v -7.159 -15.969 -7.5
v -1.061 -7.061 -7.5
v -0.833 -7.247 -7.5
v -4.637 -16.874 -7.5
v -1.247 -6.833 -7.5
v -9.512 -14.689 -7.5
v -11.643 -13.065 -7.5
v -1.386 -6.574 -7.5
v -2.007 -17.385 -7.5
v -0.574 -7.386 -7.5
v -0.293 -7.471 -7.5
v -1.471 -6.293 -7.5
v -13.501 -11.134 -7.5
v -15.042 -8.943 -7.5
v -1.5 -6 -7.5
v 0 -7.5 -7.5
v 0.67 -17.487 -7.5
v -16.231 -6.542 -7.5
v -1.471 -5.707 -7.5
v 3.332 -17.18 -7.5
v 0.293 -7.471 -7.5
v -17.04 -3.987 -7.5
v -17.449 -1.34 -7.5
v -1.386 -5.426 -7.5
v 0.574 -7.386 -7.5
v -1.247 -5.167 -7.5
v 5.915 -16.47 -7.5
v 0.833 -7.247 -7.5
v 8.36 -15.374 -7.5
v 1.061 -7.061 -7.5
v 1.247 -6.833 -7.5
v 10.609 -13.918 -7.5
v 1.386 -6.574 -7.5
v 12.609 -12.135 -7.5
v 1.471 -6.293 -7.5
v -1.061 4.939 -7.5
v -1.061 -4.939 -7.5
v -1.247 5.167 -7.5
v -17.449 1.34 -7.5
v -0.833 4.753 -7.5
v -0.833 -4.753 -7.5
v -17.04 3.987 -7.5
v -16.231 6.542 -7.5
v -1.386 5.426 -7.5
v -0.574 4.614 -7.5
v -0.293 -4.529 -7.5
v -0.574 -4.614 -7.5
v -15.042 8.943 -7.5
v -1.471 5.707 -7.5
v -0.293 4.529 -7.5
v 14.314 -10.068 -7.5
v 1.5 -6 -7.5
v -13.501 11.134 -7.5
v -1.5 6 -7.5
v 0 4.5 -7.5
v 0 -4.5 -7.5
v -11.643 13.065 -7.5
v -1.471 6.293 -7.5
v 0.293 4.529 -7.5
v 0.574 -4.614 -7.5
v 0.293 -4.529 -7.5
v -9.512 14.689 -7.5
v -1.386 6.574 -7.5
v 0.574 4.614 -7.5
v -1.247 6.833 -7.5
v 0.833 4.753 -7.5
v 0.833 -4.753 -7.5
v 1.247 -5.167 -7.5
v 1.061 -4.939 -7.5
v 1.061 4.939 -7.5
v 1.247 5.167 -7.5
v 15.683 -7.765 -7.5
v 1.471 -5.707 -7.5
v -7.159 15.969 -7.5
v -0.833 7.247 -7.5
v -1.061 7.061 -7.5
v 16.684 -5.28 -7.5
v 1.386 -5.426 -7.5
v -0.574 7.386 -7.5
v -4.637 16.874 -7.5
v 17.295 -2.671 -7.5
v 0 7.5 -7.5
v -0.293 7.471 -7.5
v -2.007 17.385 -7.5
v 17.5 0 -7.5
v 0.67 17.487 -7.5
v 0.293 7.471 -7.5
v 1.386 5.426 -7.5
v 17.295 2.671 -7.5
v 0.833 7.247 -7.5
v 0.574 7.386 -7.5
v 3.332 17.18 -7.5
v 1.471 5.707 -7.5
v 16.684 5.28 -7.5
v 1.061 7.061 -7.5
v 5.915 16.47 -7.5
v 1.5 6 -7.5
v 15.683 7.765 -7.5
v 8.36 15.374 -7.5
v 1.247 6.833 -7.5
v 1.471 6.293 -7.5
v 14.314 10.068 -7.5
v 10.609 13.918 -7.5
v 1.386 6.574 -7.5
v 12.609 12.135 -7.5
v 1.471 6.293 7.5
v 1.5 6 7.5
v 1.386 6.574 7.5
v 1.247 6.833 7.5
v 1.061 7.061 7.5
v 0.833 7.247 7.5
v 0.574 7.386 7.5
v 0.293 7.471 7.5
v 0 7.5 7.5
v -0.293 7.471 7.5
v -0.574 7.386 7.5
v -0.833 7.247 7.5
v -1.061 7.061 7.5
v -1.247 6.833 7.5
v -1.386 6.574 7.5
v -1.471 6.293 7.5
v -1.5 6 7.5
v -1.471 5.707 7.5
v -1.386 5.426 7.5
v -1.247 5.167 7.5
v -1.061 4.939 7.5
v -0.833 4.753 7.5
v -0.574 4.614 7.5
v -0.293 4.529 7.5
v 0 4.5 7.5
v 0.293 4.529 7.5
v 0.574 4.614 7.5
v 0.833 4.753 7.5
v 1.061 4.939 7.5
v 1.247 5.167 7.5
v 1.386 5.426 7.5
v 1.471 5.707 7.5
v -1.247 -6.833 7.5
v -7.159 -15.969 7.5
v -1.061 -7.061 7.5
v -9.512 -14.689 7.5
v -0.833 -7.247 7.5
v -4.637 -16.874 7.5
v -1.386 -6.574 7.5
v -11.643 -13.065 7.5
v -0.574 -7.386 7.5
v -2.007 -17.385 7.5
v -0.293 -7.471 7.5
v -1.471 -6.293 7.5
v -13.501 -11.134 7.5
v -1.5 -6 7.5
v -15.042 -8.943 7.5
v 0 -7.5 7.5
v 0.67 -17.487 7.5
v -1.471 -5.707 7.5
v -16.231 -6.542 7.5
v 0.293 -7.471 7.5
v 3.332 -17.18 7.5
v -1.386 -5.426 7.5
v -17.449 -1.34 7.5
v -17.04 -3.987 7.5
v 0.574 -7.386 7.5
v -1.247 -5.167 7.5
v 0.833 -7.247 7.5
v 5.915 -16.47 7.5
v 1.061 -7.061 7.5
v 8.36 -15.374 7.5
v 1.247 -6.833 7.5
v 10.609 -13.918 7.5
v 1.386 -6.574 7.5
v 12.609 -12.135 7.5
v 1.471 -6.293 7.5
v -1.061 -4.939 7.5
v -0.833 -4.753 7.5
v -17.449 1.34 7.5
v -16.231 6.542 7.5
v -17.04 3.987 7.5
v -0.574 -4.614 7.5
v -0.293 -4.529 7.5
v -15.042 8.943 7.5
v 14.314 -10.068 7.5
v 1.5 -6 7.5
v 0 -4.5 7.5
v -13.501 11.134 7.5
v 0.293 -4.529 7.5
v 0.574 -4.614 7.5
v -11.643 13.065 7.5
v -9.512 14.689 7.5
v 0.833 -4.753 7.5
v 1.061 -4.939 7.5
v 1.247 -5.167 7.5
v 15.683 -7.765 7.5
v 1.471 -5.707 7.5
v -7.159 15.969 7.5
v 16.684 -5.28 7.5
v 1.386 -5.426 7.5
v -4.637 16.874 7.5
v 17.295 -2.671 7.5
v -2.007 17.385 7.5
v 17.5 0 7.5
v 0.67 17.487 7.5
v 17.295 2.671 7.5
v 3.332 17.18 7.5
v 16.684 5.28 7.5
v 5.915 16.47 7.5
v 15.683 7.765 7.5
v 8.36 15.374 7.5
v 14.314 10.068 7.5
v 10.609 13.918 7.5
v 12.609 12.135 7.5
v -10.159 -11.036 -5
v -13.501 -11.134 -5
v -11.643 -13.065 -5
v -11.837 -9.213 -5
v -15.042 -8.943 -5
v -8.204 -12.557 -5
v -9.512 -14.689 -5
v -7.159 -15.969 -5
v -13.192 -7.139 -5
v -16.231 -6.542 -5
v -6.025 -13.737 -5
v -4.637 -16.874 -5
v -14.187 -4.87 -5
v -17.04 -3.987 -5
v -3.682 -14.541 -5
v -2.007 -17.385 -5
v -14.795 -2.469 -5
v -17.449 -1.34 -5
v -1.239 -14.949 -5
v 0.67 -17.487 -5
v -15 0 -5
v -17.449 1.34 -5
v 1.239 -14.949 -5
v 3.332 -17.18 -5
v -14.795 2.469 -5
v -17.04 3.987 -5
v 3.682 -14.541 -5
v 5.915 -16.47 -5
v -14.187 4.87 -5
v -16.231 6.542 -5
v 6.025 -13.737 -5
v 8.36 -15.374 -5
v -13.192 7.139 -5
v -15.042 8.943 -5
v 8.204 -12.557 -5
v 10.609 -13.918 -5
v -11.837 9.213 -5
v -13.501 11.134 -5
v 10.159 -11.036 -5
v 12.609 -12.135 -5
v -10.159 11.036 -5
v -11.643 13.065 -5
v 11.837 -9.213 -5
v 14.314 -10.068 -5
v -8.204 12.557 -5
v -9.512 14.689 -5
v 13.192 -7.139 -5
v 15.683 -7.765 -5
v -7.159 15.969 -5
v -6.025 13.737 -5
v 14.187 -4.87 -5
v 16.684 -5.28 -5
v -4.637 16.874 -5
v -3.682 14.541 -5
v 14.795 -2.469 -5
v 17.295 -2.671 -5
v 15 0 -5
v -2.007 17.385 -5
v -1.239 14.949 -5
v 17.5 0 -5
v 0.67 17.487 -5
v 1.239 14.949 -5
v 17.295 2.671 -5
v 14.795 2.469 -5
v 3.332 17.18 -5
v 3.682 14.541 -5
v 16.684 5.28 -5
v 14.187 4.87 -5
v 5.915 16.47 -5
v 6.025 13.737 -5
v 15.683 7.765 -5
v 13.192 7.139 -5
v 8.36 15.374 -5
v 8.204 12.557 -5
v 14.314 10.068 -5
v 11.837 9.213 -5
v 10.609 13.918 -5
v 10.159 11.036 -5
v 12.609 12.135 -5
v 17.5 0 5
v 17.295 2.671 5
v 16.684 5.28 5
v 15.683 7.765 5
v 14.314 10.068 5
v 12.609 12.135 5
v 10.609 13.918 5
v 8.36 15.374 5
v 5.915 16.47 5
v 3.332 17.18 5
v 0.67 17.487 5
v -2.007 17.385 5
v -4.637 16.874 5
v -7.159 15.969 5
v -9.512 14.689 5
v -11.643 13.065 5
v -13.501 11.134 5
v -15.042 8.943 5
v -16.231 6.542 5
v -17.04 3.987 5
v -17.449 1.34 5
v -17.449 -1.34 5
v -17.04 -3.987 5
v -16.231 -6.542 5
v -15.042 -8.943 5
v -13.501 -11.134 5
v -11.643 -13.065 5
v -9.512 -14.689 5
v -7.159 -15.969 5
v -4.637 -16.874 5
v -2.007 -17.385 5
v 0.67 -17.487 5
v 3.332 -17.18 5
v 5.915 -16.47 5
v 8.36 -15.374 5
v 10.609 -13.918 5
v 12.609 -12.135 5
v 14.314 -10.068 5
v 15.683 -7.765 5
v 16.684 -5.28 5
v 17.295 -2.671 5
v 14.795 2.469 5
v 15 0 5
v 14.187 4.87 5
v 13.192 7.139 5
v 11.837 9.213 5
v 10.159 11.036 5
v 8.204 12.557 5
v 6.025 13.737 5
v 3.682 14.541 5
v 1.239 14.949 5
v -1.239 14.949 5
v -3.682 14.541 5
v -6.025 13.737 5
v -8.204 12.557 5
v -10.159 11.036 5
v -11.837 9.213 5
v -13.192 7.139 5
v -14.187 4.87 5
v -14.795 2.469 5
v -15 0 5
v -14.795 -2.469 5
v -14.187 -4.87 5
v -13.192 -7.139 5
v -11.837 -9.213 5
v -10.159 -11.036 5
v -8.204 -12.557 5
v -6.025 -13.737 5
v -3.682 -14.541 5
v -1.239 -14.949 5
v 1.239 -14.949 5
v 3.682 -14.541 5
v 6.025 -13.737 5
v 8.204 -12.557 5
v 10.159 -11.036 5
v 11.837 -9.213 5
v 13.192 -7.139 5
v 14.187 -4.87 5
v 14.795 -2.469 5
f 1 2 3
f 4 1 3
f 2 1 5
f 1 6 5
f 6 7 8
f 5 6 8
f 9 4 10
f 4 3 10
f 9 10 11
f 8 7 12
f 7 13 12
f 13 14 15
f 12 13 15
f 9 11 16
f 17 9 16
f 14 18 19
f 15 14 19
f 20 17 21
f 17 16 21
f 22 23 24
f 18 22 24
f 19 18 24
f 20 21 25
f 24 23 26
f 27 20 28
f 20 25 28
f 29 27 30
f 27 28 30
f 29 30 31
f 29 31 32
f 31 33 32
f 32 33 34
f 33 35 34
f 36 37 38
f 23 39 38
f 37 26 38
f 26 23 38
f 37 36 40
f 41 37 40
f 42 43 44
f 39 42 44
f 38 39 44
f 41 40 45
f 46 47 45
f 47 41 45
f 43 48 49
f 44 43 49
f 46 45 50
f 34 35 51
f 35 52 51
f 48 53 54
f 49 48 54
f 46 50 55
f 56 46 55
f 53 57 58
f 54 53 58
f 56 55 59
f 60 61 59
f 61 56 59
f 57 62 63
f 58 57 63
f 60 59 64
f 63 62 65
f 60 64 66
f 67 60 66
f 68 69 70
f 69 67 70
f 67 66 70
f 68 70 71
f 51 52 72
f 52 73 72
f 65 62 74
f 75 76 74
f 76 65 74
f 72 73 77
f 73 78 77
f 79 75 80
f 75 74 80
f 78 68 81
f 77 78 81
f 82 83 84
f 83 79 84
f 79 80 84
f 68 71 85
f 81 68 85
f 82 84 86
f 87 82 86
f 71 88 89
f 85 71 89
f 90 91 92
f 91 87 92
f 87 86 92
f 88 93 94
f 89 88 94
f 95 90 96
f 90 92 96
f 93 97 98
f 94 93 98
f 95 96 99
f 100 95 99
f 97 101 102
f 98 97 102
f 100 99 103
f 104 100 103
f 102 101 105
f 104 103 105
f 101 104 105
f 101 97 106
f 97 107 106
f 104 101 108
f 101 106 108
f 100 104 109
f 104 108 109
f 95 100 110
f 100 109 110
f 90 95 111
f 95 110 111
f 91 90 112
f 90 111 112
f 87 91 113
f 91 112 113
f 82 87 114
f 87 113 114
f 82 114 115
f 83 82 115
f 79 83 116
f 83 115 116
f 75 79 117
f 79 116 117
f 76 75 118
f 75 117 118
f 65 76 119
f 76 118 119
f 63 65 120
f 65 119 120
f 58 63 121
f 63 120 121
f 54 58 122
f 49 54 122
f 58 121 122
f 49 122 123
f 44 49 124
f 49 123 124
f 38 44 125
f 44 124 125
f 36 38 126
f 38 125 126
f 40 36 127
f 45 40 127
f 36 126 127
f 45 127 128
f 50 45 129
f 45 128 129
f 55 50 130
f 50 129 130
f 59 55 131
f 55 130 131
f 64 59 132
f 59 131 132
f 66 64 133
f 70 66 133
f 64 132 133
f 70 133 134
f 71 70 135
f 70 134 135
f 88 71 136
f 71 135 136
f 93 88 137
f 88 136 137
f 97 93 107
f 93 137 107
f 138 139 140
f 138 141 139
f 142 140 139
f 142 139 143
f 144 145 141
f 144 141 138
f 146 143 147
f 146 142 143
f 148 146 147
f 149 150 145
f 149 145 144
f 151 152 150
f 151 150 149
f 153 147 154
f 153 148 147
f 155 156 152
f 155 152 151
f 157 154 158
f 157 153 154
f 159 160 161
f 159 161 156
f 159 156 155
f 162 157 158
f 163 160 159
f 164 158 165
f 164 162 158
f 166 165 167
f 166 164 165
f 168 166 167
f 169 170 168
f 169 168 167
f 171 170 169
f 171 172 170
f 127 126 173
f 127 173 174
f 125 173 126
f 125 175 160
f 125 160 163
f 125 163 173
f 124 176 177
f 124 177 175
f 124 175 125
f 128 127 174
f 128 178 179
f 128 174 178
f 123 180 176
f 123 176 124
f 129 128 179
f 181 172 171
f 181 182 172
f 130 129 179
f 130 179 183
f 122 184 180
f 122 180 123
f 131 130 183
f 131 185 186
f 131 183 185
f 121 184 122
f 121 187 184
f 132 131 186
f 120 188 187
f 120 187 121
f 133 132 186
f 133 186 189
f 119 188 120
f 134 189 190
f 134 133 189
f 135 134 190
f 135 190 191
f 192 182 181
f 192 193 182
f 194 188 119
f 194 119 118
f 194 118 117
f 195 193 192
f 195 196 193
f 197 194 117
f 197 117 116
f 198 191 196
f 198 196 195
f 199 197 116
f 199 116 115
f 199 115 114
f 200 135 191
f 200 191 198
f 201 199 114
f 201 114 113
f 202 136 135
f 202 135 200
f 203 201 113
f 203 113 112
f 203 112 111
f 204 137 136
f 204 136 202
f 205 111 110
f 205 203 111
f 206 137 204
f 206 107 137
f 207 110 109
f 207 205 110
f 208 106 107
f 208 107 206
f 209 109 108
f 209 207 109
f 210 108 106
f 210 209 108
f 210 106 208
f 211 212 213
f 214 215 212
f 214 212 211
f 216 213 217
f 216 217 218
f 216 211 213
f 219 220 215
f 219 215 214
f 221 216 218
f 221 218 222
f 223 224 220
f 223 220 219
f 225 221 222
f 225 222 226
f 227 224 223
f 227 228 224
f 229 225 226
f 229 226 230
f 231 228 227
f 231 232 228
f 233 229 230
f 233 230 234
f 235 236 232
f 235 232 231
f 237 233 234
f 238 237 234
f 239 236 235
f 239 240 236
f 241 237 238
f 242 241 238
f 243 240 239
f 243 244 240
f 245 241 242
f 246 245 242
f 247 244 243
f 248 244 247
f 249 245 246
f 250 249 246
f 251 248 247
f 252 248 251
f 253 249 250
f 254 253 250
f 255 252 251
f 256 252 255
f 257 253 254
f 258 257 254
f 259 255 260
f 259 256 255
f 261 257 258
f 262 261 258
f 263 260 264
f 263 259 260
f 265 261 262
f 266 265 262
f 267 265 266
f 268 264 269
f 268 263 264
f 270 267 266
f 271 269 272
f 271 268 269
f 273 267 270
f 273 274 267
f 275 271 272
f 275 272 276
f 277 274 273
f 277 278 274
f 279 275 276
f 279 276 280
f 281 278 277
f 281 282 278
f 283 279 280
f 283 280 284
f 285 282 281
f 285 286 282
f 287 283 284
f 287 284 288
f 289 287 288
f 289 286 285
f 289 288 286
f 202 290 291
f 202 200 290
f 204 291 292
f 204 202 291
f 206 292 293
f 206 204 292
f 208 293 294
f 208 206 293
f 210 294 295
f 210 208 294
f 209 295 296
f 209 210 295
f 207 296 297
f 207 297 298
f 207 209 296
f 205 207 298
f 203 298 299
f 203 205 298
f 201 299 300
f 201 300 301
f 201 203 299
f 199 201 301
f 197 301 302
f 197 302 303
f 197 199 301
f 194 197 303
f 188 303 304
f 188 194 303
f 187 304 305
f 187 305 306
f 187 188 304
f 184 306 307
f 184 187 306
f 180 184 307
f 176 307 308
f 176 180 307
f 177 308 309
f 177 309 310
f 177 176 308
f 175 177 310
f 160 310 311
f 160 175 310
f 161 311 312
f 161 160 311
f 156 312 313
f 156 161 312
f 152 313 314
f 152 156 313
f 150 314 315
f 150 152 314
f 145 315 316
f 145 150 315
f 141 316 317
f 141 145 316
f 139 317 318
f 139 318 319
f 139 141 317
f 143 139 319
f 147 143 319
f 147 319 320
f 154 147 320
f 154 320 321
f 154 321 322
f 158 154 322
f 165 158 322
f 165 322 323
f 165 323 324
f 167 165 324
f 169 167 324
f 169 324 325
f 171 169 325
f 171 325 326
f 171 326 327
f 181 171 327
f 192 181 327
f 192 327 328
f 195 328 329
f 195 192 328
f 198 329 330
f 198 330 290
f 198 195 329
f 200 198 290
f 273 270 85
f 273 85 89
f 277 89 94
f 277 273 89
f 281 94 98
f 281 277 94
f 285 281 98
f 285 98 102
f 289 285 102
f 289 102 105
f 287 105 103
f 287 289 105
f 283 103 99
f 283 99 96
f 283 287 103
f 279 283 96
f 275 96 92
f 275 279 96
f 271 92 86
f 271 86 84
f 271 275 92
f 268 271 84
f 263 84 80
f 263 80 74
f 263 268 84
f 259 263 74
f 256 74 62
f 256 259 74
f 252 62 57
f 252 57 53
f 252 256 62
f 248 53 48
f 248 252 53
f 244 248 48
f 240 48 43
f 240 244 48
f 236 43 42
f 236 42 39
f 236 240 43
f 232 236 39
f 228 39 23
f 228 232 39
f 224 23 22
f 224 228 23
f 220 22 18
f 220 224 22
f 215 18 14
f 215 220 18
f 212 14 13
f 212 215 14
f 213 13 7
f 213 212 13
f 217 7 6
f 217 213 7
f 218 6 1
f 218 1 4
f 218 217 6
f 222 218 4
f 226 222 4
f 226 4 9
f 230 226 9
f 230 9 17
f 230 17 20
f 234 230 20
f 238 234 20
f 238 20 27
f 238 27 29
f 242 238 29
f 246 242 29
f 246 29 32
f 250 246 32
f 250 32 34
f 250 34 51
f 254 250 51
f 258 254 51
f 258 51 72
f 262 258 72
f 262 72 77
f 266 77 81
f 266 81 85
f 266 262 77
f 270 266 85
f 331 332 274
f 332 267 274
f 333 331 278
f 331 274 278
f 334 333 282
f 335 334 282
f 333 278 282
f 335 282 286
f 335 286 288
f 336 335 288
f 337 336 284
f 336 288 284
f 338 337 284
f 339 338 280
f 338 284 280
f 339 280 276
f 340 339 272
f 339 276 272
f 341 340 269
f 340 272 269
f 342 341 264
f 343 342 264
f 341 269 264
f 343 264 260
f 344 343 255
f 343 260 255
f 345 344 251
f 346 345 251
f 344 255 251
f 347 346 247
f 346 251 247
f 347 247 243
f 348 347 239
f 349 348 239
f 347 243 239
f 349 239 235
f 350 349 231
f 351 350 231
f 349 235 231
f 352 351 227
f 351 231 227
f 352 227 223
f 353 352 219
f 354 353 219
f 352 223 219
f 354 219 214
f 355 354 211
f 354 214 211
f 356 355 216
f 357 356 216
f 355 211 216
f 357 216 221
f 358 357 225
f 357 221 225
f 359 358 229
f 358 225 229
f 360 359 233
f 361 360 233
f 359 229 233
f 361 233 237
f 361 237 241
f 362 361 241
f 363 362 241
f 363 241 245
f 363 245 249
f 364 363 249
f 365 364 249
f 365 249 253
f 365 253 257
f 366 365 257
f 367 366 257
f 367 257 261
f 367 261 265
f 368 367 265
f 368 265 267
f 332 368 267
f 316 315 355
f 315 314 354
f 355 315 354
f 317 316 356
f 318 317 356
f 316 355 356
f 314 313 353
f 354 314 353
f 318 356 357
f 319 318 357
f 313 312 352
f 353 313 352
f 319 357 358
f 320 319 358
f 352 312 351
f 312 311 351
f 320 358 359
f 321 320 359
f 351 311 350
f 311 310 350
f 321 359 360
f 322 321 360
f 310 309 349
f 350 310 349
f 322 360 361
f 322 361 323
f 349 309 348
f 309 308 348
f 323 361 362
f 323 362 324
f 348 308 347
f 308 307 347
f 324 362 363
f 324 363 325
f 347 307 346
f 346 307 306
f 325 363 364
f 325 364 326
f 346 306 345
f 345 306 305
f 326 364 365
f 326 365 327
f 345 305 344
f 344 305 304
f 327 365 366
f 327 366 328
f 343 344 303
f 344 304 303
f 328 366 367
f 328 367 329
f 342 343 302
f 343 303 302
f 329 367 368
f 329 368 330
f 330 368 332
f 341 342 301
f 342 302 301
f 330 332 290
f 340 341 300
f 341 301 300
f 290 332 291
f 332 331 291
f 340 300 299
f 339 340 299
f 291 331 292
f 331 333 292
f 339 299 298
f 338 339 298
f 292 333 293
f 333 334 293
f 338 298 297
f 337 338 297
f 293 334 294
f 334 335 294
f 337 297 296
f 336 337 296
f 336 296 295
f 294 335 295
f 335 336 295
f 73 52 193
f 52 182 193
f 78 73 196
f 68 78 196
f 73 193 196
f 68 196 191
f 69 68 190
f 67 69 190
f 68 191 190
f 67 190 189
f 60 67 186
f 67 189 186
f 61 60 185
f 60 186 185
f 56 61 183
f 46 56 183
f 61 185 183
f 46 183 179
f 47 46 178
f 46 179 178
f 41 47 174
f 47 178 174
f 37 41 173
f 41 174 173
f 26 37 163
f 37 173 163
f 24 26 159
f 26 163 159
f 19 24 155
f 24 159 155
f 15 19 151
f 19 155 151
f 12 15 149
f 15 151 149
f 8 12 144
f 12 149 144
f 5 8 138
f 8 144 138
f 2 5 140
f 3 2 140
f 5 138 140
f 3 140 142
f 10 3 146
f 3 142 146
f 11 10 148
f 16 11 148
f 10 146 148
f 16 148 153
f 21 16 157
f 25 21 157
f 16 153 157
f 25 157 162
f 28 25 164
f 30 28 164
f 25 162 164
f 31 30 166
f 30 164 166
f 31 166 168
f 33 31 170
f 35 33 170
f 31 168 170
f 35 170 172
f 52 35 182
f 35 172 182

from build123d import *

# Parameters (mm, degrees)
CROQUIS1_R              = 17.5
SALIENTE_EXTRUIR1_DEPTH = 7.5
CROQUIS2_R              = 17.5
CROQUIS2_R_2            = 15
CORTAR_EXTRUIR1_DEPTH   = 5
CROQUIS3_R              = 1.5
CORTAR_EXTRUIR2_DEPTH   = 10


with BuildPart() as part:
    # Croquis1 → Saliente-Extruir1 (new, symmetric)
    with BuildSketch(Plane(origin=(0, 0, 0), x_dir=(0, 1, 0), z_dir=(0, 0, 1))):
        with Locations(Location((0, 0, 0), (0, 0, 270))):
            Circle(CROQUIS1_R)
    extrude(amount=SALIENTE_EXTRUIR1_DEPTH, both=True)

    # Croquis2 → Cortar-Extruir1 (cut, symmetric)
    with BuildSketch(Plane(origin=(0, 0, 0), x_dir=(0, 1, 0), z_dir=(0, 0, 1))):
        with Locations(Location((0, 0, 0), (0, 0, 270))):
            Circle(CROQUIS2_R)
        with Locations(Location((0, 0, 0), (0, 0, 270))):
            Circle(CROQUIS2_R_2, mode=Mode.SUBTRACT)
    extrude(amount=CORTAR_EXTRUIR1_DEPTH, both=True, mode=Mode.SUBTRACT)

    # Croquis3 → Cortar-Extruir2 (cut, symmetric)
    with BuildSketch(Plane(origin=(0, 0, 0), x_dir=(0, 1, 0), z_dir=(0, 0, 1))):
        with Locations(Location((6, 0, 0), (0, 0, 270))):
            Circle(CROQUIS3_R)
        with Locations(Location((-6, 0, 0), (0, 0, 270))):
            Circle(CROQUIS3_R)
    extrude(amount=CORTAR_EXTRUIR2_DEPTH, both=True, mode=Mode.SUBTRACT)


solid = part.part
